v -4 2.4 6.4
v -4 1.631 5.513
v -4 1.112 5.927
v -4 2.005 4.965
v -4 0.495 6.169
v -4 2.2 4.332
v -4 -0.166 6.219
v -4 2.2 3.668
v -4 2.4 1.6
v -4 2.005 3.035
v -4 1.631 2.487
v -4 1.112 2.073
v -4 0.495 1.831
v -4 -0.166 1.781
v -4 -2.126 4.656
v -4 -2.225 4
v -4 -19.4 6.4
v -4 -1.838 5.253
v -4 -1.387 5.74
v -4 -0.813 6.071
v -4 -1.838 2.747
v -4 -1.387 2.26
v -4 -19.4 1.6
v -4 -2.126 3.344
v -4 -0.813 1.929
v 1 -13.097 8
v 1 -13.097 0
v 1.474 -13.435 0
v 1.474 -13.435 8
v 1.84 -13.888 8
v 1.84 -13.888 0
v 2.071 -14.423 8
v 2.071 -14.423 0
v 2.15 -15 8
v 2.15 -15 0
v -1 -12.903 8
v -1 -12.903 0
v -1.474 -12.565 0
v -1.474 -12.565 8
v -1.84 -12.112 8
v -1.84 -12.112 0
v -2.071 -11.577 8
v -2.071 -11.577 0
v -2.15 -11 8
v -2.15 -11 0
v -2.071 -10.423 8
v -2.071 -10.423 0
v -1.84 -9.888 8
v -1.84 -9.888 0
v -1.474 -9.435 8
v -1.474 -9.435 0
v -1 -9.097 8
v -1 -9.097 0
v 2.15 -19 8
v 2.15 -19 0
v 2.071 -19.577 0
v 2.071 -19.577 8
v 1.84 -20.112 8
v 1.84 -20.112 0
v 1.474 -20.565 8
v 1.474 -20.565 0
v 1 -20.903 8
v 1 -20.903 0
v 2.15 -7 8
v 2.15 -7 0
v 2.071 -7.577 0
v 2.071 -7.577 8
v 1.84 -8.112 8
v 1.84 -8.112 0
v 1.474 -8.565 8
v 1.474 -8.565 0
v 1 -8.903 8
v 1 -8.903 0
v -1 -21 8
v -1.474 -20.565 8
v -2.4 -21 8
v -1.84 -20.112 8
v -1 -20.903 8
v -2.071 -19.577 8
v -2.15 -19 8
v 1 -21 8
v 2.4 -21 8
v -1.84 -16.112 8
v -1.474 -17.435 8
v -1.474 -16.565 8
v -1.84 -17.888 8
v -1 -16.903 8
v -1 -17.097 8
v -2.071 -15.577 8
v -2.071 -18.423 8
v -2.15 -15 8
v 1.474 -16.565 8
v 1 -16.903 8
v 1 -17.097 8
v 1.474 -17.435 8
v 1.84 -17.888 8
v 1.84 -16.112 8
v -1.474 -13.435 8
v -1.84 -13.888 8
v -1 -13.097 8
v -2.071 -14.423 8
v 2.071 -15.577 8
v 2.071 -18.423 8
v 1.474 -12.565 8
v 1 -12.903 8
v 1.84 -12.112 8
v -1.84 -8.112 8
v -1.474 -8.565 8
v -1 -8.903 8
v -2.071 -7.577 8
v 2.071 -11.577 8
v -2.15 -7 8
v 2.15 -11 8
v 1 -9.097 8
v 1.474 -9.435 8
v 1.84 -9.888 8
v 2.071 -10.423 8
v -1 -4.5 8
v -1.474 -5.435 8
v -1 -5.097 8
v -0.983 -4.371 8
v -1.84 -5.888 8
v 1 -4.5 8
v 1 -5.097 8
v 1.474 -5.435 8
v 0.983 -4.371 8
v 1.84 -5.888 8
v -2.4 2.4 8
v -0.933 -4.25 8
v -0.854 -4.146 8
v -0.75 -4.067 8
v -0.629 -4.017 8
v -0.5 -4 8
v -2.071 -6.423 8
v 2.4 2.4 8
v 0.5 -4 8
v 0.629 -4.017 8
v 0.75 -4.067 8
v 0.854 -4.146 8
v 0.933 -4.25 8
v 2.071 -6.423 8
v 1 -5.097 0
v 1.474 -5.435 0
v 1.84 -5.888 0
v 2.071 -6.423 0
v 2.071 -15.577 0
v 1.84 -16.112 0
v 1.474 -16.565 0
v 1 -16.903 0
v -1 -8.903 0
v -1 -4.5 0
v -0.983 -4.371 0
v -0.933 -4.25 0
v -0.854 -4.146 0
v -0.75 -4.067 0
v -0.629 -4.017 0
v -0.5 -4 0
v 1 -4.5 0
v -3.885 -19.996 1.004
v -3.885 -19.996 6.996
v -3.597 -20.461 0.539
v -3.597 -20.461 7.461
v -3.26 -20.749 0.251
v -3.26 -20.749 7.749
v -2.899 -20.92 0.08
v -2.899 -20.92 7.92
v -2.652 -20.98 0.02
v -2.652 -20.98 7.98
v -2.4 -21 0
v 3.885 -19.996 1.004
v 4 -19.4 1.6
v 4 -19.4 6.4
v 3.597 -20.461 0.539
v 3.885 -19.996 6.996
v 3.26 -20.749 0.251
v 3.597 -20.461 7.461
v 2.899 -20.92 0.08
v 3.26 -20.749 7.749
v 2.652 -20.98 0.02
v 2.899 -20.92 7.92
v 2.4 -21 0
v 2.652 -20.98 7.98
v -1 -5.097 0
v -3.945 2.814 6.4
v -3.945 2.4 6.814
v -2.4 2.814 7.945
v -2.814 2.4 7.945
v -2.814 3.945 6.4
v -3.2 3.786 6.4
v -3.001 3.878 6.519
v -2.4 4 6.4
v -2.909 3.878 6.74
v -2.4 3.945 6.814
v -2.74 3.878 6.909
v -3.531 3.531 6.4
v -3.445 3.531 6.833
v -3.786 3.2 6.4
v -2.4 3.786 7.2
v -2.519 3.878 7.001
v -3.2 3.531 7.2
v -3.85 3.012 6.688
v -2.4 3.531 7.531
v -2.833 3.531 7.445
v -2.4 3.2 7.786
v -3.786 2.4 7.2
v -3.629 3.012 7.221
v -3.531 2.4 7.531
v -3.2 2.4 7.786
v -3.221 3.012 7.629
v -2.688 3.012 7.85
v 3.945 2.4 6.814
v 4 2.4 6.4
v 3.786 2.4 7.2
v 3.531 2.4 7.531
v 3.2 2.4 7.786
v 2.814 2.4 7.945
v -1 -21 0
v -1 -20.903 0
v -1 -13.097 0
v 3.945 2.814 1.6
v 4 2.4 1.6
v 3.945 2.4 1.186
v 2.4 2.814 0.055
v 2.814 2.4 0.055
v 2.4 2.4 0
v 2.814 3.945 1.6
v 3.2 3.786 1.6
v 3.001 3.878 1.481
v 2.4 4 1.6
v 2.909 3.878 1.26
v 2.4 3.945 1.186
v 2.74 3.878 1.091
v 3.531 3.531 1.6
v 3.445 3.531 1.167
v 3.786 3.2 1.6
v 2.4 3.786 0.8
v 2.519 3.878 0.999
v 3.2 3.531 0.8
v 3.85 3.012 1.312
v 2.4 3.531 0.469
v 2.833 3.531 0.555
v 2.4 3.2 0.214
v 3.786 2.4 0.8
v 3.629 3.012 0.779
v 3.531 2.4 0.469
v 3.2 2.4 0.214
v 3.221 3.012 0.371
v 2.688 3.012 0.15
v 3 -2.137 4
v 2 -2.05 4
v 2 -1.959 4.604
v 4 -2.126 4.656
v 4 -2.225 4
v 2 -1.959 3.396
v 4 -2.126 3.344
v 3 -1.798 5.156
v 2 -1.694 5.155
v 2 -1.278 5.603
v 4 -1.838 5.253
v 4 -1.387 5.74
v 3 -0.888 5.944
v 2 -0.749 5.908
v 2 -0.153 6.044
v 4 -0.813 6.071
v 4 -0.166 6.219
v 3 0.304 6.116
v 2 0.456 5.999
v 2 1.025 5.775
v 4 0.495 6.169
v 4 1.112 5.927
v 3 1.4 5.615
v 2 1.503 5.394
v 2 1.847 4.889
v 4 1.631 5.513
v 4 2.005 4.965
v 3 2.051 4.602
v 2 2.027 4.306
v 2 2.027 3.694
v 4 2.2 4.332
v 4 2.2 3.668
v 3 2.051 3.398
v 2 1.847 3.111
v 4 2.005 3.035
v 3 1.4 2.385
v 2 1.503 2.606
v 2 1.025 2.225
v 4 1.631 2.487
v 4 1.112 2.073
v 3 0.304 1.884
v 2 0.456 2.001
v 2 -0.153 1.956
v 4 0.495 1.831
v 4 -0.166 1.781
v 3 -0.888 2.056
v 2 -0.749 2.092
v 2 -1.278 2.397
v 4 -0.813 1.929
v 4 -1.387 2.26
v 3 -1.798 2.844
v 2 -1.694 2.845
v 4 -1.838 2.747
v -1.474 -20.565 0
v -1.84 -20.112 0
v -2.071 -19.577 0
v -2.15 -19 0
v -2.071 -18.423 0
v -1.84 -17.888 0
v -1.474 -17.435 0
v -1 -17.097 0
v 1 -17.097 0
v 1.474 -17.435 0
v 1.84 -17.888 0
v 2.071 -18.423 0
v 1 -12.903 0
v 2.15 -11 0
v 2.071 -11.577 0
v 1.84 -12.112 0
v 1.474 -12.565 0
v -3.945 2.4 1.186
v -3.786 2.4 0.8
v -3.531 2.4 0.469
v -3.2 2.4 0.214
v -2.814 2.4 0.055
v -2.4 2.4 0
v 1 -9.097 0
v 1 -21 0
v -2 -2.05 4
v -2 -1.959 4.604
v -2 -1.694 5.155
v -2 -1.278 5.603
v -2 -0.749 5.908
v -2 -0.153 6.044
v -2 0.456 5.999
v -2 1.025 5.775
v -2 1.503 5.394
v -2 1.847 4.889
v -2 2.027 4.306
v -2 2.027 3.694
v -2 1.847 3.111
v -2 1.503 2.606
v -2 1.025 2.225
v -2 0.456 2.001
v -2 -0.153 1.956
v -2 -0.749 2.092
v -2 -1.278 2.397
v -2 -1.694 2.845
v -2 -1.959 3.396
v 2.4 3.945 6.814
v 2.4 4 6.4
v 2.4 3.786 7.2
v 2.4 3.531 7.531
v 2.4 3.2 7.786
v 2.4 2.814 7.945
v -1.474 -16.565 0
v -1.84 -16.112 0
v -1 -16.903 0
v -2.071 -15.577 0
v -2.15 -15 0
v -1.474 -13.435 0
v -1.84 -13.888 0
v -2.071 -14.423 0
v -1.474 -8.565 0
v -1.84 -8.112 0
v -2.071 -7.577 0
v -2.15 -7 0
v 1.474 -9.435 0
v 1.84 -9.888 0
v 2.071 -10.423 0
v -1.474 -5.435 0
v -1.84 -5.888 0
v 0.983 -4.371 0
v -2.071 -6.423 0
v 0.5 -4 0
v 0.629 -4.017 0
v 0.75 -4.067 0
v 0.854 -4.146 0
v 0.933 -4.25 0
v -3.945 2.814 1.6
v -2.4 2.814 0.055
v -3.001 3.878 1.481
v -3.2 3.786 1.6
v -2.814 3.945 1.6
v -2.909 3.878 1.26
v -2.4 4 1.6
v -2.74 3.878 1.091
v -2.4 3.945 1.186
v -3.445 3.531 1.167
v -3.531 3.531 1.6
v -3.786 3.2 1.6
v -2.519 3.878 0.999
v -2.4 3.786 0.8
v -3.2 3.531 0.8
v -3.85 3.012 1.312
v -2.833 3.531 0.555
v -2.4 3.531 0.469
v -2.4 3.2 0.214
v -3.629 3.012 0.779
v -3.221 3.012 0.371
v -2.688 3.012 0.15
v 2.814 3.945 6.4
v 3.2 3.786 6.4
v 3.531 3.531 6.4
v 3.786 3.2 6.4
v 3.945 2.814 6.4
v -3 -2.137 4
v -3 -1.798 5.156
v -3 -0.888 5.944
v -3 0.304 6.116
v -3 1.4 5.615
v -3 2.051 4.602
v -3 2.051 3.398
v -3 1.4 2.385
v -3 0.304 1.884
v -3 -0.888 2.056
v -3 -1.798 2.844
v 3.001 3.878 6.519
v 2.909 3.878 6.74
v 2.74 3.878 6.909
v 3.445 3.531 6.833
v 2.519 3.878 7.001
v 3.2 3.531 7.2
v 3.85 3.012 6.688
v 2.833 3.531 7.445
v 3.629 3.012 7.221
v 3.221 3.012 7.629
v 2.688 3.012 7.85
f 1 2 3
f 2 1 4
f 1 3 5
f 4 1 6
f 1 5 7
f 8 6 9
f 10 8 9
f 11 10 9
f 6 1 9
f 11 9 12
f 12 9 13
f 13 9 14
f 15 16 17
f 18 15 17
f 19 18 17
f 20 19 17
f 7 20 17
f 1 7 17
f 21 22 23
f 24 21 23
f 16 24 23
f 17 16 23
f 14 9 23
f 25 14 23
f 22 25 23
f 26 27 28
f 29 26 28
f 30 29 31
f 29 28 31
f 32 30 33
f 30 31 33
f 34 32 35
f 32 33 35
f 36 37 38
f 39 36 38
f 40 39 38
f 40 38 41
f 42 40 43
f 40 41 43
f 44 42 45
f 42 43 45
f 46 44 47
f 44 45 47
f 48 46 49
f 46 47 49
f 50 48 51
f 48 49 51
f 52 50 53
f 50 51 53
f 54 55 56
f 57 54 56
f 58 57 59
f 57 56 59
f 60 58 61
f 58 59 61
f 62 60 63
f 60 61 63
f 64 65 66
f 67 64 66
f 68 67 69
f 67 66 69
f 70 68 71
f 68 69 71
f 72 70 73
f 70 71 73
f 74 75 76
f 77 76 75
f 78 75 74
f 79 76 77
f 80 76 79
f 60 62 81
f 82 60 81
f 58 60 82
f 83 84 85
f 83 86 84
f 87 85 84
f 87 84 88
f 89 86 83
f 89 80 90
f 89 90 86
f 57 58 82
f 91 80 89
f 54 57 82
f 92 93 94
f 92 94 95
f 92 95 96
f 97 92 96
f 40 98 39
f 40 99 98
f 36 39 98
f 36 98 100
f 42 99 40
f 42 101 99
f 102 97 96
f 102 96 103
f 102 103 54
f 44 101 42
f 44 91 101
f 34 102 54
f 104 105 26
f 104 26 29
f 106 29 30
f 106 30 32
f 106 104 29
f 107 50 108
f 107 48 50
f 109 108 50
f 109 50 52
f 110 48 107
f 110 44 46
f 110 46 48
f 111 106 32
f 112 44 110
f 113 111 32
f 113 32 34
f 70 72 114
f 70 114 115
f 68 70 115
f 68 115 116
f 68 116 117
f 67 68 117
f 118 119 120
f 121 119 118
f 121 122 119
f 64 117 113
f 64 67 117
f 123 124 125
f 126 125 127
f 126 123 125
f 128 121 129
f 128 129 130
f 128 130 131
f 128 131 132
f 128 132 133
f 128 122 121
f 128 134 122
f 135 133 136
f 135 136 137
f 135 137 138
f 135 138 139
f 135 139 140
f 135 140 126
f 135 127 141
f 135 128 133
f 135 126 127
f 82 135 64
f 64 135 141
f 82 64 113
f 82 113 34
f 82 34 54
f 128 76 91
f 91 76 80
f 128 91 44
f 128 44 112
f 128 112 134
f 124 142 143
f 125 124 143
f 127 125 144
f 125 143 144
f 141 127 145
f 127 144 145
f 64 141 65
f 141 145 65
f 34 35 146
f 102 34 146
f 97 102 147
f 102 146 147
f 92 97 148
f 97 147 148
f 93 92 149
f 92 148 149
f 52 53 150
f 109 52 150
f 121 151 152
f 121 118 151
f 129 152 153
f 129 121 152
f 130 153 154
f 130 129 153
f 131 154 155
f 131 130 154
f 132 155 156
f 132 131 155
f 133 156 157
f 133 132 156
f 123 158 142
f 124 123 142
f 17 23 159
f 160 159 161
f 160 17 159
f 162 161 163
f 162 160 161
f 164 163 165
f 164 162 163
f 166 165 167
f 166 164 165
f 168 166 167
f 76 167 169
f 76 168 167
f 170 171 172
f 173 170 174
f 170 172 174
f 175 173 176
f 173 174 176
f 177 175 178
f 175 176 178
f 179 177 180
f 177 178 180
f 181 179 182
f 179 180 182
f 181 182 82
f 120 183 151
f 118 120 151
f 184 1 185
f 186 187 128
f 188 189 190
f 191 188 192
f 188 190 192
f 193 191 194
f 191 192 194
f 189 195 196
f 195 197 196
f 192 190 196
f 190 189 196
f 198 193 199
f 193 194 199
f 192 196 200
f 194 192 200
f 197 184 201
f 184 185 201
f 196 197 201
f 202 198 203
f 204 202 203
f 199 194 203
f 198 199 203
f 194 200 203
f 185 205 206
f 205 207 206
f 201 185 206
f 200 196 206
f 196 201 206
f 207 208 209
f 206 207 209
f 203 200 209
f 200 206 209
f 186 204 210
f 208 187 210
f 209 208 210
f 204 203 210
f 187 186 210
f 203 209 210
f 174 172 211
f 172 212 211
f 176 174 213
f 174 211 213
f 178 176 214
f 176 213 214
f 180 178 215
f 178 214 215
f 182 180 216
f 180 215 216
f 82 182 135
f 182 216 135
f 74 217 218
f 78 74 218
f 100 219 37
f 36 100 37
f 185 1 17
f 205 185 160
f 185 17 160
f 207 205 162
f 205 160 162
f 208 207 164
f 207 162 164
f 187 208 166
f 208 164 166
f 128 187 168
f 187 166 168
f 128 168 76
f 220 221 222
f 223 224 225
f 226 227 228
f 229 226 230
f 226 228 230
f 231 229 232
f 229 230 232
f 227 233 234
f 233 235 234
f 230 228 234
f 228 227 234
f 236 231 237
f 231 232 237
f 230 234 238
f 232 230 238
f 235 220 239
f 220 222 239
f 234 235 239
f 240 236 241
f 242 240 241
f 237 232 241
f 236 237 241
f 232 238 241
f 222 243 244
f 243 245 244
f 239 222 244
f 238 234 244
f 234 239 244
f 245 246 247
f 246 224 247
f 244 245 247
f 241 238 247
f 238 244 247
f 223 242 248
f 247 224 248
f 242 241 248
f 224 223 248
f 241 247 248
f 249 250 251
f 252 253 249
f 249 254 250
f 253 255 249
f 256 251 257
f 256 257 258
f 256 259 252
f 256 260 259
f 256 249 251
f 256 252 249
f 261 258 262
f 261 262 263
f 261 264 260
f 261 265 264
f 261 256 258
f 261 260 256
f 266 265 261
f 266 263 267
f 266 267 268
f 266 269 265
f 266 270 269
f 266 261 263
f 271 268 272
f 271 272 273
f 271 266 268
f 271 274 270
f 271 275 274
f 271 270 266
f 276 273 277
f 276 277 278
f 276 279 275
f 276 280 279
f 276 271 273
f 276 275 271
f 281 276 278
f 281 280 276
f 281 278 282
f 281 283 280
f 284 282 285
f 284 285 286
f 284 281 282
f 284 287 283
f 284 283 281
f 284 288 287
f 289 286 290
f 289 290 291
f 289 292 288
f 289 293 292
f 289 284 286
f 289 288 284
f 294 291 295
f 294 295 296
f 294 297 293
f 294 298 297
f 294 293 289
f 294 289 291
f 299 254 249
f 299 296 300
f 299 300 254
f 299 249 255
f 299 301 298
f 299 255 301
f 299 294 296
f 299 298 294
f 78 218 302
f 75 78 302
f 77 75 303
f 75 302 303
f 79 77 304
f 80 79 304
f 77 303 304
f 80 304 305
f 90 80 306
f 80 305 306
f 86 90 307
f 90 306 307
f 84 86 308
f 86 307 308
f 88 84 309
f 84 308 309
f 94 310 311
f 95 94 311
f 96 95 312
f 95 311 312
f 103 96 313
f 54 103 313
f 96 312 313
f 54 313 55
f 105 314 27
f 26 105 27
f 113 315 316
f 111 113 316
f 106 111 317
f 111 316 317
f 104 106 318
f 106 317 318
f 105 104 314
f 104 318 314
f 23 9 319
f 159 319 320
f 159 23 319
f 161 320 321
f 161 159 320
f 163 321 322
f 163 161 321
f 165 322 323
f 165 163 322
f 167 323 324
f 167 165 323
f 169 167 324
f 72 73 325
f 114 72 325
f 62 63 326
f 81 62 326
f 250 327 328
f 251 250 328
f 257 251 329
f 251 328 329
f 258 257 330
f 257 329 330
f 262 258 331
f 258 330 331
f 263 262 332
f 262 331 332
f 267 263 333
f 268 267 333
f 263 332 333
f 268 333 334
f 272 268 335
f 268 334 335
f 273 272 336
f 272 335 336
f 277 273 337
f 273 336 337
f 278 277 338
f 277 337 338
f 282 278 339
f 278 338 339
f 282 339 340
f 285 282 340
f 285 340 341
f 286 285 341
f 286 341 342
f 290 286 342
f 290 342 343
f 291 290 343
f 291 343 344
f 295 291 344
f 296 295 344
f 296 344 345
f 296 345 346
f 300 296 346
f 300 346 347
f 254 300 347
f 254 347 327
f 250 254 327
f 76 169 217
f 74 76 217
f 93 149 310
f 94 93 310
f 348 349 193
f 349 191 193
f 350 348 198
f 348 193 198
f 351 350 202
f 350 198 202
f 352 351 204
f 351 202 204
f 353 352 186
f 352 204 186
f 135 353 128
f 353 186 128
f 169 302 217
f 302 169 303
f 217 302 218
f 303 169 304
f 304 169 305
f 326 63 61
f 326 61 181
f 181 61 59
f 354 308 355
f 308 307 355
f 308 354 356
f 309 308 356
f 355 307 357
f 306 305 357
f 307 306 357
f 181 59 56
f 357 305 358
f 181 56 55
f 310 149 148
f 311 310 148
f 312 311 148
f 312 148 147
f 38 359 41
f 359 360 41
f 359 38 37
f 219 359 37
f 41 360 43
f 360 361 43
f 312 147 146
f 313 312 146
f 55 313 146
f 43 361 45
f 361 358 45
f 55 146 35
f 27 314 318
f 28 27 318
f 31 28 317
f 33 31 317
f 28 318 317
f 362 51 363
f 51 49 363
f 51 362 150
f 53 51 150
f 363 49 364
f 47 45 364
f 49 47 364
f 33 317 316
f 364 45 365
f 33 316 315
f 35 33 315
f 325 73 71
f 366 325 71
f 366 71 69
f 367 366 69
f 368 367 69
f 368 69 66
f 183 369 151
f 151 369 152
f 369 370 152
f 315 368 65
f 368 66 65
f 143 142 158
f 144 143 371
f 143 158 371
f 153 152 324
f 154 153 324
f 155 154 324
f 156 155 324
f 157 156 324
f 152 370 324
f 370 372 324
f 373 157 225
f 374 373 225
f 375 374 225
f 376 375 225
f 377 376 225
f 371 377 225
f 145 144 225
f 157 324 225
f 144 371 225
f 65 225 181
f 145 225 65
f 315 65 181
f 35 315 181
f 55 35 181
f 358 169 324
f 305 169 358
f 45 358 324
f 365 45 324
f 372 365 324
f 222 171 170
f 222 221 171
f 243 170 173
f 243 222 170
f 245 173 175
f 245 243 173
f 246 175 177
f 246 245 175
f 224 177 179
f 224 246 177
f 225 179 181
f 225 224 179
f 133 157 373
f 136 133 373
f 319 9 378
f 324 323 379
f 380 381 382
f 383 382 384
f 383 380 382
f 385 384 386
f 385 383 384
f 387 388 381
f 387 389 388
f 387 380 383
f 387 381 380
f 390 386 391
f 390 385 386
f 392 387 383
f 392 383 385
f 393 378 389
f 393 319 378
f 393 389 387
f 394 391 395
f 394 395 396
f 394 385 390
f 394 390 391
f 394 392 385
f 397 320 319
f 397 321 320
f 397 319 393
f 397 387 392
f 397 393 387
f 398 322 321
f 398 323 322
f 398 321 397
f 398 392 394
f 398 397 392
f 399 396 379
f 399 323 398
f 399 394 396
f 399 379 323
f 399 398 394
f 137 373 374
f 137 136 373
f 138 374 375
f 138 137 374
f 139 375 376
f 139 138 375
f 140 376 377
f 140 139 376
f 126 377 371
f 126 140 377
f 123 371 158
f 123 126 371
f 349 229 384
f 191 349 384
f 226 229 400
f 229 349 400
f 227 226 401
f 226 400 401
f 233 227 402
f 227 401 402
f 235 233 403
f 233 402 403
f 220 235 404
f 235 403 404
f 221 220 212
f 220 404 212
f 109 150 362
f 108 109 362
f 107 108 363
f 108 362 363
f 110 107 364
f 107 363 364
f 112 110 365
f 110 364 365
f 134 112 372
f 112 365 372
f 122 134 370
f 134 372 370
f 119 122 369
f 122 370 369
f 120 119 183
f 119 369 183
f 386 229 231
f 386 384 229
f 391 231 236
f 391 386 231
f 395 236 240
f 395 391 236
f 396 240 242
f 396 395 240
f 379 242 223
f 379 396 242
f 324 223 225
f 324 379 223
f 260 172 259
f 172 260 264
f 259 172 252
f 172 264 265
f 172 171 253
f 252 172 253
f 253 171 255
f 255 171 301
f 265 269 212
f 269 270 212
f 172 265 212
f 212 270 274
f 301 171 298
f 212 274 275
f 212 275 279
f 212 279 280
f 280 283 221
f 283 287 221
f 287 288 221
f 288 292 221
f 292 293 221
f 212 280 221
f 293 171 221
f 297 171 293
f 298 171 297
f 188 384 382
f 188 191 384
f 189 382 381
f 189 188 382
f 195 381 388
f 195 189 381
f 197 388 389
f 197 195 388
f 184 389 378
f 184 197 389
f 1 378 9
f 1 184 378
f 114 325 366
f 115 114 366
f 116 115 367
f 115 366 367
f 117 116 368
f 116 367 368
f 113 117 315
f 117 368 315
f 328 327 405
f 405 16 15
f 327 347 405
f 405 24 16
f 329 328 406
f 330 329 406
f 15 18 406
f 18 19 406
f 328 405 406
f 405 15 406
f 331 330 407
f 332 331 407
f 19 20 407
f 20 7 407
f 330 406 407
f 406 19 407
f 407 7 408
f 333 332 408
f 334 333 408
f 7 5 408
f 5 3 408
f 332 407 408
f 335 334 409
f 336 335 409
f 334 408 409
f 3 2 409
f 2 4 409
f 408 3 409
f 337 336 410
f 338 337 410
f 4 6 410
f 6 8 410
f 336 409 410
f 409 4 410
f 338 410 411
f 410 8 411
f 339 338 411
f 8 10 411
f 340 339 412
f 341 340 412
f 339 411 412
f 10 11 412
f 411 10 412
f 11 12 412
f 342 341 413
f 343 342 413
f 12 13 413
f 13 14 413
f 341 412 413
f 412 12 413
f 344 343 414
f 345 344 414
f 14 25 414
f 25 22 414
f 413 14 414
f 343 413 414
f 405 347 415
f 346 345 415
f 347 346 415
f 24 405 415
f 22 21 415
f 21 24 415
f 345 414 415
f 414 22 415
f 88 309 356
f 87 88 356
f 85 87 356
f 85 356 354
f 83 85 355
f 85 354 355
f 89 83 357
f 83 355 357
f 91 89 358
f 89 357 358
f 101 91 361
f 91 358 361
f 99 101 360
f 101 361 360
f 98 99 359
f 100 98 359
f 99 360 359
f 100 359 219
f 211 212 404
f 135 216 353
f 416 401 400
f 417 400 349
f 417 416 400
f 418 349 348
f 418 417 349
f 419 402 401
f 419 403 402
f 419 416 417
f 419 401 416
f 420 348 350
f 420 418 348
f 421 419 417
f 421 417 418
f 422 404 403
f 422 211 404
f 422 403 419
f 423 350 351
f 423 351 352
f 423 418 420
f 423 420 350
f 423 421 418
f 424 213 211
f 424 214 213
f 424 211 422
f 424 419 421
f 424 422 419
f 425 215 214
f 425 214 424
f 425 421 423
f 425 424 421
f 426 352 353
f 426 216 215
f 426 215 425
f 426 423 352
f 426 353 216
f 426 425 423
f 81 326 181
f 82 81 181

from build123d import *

# Parameters (mm, degrees)
F1_DEPTH = 8
F2_R     = 2.05
F3_DEPTH = 8.001
F4_R     = 1.6
F5_R     = 0.5
F6_SIZE2 = 0.1749773271
F6_SIZE  = 2


with BuildPart() as f1:
    # F0 (on Top) → F1 (new body)
    with BuildSketch(Plane.XY):
        Polygon((1, -4), (4, -4), (4, 4), (-4, 4), (-4, -4), (-1, -4), align=None)
        with BuildLine():
            Line((-1, -5.0967133689), (-1, -4))
            Line((-1, -4), (-4, -4))
            Line((-4, -4), (-4, -21))
            Line((-4, -21), (-1, -21))
            Line((-1, -21), (-1, -20.9032866311))
            ThreePointArc((-1, -20.9032866311), (-2.15, -19), (-1, -17.0967133689))
            Line((-1, -17.0967133689), (-1, -16.9032866311))
            ThreePointArc((-1, -16.9032866311), (-2.15, -15), (-1, -13.0967133689))
            Line((-1, -13.0967133689), (-1, -12.9032866311))
            ThreePointArc((-1, -12.9032866311), (-2.15, -11), (-1, -9.0967133689))
            Line((-1, -9.0967133689), (-1, -8.9032866311))
            ThreePointArc((-1, -8.9032866311), (-2.15, -7), (-1, -5.0967133689))
        make_face()
        with BuildLine():
            Line((4, -21), (4, -4))
            Line((4, -4), (1, -4))
            Line((1, -4), (1, -5.0967133689))
            ThreePointArc((1, -5.0967133689), (1.840176622, -5.8881322021), (2.15, -7))
            ThreePointArc((2.15, -7), (1.840176622, -8.1118677979), (1, -8.9032866311))
            Line((1, -8.9032866311), (1, -9.0967133689))
            ThreePointArc((1, -9.0967133689), (1.840176622, -9.8881322021), (2.15, -11))
            ThreePointArc((2.15, -11), (1.840176622, -12.1118677979), (1, -12.9032866311))
            Line((1, -12.9032866311), (1, -13.0967133689))
            ThreePointArc((1, -13.0967133689), (1.840176622, -13.8881322021), (2.15, -15))
            ThreePointArc((2.15, -15), (1.840176622, -16.1118677979), (1, -16.9032866311))
            Line((1, -16.9032866311), (1, -17.0967133689))
            ThreePointArc((1, -17.0967133689), (1.840176622, -17.8881322021), (2.15, -19))
            ThreePointArc((2.15, -19), (1.840176622, -20.1118677979), (1, -20.9032866311))
            Line((1, -20.9032866311), (1, -21))
            Line((1, -21), (4, -21))
        make_face()
    extrude(amount=F1_DEPTH)

    # F2 (on face) → F3 (cut, through all)
    with BuildSketch(Plane(origin=(-4, 0, 0), x_dir=(0, -1, 0), z_dir=(-1, 0, 0))):
        with Locations((0, 4)):
            Circle(F2_R)
    extrude(amount=-F3_DEPTH, mode=Mode.SUBTRACT)

    # F4
    f4_edges = [f1.edges().sort_by_distance(p)[0] for p in [
        (4, -8.5, 8),
        (4, -8.5, 0),
        (4, 4, 4),
        (4, -21, 4),
        (-4, -21, 4),
        (-4, -8.5, 8),
        (-4, -8.5, 0),
        (-4, 4, 4),
        (0, 4, 8),
        (0, 4, 0),
    ]]
    fillet(f4_edges, radius=F4_R)

    # F5
    f5_edges = [f1.edges().sort_by_distance(p)[0] for p in [
        (1, -4, 4),
        (-1, -4, 4),
    ]]
    fillet(f5_edges, radius=F5_R)

    # F6
    f6_edges = [f1.edges().sort_by_distance(p)[0] for p in [
        (-4, 2.05, 4),
        (4, 2.05, 4),
    ]]
    f6_side = f1.faces().sort_by_distance((0, 2.05, 4))[0]
    chamfer(f6_edges, length=F6_SIZE, length2=F6_SIZE2, reference=f6_side)


solid = f1.part
